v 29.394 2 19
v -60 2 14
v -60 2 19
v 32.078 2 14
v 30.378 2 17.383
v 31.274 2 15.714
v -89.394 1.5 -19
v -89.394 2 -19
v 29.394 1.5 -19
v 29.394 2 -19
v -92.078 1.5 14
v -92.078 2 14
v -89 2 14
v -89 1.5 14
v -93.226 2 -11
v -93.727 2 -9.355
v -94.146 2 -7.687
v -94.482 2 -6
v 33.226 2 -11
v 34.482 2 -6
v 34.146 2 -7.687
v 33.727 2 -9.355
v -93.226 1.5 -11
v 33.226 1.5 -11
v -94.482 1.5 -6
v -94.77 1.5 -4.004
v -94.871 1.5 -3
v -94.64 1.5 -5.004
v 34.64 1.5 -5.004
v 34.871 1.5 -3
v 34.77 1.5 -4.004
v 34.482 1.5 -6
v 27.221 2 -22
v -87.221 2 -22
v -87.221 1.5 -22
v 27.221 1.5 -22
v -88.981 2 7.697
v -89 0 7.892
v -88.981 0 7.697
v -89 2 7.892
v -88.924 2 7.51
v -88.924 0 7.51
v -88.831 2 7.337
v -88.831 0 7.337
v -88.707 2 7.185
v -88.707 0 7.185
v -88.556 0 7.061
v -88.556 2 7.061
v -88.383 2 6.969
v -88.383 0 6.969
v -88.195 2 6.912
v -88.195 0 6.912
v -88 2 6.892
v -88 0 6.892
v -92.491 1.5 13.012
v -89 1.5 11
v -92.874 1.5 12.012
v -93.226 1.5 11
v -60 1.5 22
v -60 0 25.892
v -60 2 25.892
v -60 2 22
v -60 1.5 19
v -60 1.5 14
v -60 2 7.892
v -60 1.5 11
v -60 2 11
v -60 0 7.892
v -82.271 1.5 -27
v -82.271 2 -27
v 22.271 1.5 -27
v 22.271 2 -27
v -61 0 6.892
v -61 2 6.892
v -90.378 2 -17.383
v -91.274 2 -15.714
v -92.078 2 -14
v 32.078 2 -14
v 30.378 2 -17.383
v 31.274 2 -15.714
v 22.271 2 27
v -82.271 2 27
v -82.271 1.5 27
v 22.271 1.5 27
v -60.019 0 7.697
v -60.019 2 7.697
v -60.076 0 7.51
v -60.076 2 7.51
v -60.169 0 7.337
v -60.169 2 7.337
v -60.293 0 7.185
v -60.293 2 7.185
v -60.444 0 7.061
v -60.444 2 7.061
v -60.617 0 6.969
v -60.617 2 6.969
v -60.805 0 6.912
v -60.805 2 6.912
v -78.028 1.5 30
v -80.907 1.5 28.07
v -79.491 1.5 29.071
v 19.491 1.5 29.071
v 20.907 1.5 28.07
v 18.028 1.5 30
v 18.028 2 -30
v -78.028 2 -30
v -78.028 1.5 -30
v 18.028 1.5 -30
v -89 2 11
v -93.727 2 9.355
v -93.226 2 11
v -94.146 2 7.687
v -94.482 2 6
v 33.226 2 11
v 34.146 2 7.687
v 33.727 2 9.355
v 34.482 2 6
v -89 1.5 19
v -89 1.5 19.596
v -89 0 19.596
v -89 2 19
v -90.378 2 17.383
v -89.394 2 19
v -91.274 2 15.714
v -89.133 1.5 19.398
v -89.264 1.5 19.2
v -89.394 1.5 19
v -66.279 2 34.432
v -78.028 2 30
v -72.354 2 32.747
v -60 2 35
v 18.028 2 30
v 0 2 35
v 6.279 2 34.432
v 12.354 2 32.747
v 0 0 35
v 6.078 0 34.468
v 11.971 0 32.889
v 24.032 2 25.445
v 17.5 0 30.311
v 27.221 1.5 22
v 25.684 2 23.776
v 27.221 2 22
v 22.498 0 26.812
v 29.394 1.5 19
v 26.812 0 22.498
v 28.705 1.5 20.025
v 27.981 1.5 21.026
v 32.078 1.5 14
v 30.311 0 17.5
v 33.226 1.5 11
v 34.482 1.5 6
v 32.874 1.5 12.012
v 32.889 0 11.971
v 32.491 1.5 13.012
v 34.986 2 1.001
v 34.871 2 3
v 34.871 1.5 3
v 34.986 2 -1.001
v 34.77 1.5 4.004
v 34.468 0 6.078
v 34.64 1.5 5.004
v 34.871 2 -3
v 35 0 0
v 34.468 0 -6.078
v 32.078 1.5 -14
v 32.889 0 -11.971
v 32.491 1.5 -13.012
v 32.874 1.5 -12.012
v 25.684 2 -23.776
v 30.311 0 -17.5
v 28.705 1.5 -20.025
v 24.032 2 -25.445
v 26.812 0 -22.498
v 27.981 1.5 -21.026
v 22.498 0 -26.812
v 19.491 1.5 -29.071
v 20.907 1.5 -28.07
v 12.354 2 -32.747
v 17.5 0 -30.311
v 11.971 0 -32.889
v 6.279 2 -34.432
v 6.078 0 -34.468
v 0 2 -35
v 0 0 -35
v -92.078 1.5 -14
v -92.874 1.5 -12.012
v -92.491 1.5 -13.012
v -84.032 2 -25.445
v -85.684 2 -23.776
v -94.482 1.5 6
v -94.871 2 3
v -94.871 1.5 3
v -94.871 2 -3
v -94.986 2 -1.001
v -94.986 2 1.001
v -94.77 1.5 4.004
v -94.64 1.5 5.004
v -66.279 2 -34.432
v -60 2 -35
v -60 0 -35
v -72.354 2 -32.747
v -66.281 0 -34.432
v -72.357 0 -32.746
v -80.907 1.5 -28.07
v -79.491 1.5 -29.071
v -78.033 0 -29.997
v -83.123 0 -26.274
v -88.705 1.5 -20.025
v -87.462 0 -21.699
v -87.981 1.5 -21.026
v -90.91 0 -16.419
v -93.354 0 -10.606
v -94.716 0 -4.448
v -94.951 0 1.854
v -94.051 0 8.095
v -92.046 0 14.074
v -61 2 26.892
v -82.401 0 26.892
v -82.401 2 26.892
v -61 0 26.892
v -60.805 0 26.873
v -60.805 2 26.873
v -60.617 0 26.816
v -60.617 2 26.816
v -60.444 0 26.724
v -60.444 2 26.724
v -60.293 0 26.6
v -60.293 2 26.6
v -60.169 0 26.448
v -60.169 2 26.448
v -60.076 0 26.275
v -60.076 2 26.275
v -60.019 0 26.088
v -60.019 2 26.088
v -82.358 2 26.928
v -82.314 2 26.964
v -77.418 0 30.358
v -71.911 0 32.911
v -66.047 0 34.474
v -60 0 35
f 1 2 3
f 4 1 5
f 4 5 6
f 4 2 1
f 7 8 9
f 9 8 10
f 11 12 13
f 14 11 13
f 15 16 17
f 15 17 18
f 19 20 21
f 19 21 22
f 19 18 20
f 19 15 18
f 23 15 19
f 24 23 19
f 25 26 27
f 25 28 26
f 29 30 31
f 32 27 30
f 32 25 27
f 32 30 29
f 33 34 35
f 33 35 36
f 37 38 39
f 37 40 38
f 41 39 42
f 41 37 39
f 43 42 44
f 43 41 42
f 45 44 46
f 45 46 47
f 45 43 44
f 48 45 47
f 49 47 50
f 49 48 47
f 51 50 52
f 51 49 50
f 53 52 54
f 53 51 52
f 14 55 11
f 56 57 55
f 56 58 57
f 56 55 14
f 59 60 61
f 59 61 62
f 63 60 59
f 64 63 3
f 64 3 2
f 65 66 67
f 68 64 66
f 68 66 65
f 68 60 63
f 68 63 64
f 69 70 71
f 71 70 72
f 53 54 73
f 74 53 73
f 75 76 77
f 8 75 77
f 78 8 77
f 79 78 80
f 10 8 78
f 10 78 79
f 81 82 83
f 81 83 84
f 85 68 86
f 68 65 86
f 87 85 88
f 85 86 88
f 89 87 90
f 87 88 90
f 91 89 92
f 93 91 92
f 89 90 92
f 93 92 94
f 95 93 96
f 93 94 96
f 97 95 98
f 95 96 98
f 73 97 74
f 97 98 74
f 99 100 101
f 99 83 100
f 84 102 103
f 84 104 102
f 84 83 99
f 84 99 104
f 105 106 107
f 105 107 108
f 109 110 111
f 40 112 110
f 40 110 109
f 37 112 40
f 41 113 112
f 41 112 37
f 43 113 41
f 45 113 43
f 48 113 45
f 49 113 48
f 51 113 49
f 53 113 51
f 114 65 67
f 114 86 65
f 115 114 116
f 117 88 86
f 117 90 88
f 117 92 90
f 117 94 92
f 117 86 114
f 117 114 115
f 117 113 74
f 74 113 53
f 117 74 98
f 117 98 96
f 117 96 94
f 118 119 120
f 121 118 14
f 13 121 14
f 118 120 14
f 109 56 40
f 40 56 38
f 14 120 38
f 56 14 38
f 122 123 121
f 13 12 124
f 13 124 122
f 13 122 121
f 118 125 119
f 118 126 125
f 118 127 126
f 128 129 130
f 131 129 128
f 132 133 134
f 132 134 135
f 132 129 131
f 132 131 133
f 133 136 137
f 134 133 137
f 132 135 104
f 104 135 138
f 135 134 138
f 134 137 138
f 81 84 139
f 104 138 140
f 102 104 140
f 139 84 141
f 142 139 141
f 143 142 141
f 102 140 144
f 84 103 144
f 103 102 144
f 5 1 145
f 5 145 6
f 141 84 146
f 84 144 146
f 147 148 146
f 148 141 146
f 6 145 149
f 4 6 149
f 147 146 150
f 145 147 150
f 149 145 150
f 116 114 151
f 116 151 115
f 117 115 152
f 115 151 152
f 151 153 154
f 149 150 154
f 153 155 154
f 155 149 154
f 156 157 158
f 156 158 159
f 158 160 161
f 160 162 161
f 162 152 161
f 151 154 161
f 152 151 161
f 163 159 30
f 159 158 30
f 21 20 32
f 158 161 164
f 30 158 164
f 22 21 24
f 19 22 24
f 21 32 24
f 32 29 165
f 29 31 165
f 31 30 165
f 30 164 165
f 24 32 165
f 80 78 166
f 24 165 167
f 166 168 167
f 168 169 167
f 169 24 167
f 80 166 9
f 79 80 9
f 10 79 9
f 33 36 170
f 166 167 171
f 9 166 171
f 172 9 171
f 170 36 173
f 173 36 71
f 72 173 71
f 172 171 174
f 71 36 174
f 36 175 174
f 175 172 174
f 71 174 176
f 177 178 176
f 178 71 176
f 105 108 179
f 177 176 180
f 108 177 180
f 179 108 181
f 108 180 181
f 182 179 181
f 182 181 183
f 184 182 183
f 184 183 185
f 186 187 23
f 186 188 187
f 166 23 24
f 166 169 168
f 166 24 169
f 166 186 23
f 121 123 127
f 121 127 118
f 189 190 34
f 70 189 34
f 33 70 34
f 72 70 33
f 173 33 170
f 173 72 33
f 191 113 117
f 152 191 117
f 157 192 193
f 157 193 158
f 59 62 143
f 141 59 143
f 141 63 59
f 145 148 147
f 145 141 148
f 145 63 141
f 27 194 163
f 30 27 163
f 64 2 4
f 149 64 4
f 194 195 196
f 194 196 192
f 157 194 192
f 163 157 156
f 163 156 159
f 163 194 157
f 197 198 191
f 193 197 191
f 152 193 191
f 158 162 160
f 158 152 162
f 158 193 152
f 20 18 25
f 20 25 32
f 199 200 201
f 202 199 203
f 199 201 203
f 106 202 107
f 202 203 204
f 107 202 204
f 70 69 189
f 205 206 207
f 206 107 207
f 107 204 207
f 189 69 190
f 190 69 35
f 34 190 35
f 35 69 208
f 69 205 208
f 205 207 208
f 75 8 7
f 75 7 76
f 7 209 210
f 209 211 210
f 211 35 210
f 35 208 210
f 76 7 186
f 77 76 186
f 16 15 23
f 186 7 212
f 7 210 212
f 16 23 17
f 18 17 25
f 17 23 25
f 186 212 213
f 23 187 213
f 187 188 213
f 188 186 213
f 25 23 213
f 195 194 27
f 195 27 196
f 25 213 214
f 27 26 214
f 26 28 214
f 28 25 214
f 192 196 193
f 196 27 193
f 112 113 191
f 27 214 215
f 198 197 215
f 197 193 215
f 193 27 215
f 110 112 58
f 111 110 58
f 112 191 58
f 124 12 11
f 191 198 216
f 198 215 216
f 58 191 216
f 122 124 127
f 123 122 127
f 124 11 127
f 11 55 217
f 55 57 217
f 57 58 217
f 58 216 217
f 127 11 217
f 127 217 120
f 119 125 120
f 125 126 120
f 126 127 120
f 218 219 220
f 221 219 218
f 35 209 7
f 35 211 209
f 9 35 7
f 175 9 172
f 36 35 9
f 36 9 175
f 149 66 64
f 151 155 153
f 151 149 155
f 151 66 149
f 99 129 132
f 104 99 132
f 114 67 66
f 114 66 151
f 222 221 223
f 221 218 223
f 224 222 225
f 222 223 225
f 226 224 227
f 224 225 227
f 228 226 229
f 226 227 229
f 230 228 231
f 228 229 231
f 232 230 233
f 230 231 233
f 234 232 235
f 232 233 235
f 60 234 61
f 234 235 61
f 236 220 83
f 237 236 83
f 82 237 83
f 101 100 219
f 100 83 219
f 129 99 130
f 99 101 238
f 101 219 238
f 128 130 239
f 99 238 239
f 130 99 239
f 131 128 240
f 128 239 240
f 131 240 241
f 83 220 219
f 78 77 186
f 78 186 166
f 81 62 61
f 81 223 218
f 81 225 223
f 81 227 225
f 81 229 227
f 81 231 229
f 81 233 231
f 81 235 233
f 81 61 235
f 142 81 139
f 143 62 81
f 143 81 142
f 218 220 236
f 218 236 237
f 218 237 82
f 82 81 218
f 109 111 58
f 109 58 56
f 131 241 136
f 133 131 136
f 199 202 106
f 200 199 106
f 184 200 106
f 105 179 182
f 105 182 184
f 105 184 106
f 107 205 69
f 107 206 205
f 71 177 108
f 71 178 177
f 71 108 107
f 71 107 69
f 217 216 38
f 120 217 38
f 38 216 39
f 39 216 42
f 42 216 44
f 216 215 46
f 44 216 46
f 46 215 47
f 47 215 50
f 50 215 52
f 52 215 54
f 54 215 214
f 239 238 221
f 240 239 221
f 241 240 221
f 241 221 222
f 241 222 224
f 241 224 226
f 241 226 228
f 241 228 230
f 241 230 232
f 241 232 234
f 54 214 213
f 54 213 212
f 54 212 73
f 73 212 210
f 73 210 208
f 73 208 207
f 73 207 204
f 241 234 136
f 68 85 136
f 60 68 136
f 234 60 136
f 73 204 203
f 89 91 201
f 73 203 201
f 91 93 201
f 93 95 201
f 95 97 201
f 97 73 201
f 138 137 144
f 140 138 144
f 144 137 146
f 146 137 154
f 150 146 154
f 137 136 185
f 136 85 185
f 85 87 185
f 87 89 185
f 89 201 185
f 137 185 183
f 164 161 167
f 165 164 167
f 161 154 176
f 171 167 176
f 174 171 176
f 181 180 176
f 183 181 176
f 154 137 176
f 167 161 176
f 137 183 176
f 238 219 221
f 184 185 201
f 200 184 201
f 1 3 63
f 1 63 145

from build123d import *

# Parameters (mm, degrees)
BOSS_EXTRUDE1_DEPTH     = 2
SKETCH2_W               = 110.931662833
SKETCH2_H               = 3
SKETCH2_W_2             = 124.512387616
SKETCH2_W_3             = 131.50444394
SKETCH2_W_4             = 133.924771129
CUT_EXTRUDE1_DEPTH      = 0.5
CUT_EXTRUDE3_DEPTH      = 102.262036322
CUT_EXTRUDE3_DEPTH_BACK = 102.262036322
SKETCH3_W               = 29
SKETCH3_H               = 20
FILLET1_R               = 1


with BuildPart() as part:
    # Sketch1 → Boss-Extrude1 (new body)
    with BuildSketch(Plane(origin=(0, 0, 0), x_dir=(1, 0, 0), z_dir=(0, 1, 0))):
        with BuildLine():
            Line((0, 35), (-60, 35))
            ThreePointArc((-60, 35), (-95, 0), (-60, -35))
            Line((-60, -35), (0, -35))
            ThreePointArc((0, -35), (35, 0), (0, 35))
        make_face()
    extrude(amount=BOSS_EXTRUDE1_DEPTH)

    # Sketch2 → Cut-Extrude1 (cut)
    with BuildSketch(Plane(origin=(0, 2, 0), x_dir=(1, 0, 0), z_dir=(0, 1, 0))):
        with Locations((-30.336156555, 28.5)):
            Rectangle(SKETCH2_W, SKETCH2_H)
        with Locations((-30, 20.5)):
            Rectangle(SKETCH2_W_2, SKETCH2_H)
        with Locations((-29.865537378, 12.5)):
            Rectangle(SKETCH2_W_3, SKETCH2_H)
        with Locations((-28.655373784, 4.5)):
            Rectangle(SKETCH2_W_4, SKETCH2_H)
        with Locations((-28.655373784, -4.5)):
            Rectangle(SKETCH2_W_4, SKETCH2_H)
        with Locations((-29.865537378, -12.5)):
            Rectangle(SKETCH2_W_3, SKETCH2_H)
        with Locations((-30, -20.5)):
            Rectangle(SKETCH2_W_2, SKETCH2_H)
        with Locations((-30.336156555, -28.5)):
            Rectangle(SKETCH2_W, SKETCH2_H)
    extrude(amount=-CUT_EXTRUDE1_DEPTH, mode=Mode.SUBTRACT)

    # Sketch3 → Cut-Extrude3 (cut, two sides: drawn at the far end of the back side and taken through both)
    with BuildSketch(Plane(origin=(0, 0, 0), x_dir=(1, 0, 0), z_dir=(0, 1, 0)).offset(-CUT_EXTRUDE3_DEPTH_BACK)):
        with Locations((-74.5, -16.892498432)):
            Rectangle(SKETCH3_W, SKETCH3_H)
    extrude(amount=CUT_EXTRUDE3_DEPTH + CUT_EXTRUDE3_DEPTH_BACK, mode=Mode.SUBTRACT)

    # Fillet1
    fillet1_edges = [part.edges().sort_by_distance(p)[0] for p in [
        (-60, 1, 6.892498432),
        (-89, 1, 6.892498432),
        (-60, 1, 26.892498432),
    ]]
    fillet(fillet1_edges, radius=FILLET1_R)


solid = part.part
